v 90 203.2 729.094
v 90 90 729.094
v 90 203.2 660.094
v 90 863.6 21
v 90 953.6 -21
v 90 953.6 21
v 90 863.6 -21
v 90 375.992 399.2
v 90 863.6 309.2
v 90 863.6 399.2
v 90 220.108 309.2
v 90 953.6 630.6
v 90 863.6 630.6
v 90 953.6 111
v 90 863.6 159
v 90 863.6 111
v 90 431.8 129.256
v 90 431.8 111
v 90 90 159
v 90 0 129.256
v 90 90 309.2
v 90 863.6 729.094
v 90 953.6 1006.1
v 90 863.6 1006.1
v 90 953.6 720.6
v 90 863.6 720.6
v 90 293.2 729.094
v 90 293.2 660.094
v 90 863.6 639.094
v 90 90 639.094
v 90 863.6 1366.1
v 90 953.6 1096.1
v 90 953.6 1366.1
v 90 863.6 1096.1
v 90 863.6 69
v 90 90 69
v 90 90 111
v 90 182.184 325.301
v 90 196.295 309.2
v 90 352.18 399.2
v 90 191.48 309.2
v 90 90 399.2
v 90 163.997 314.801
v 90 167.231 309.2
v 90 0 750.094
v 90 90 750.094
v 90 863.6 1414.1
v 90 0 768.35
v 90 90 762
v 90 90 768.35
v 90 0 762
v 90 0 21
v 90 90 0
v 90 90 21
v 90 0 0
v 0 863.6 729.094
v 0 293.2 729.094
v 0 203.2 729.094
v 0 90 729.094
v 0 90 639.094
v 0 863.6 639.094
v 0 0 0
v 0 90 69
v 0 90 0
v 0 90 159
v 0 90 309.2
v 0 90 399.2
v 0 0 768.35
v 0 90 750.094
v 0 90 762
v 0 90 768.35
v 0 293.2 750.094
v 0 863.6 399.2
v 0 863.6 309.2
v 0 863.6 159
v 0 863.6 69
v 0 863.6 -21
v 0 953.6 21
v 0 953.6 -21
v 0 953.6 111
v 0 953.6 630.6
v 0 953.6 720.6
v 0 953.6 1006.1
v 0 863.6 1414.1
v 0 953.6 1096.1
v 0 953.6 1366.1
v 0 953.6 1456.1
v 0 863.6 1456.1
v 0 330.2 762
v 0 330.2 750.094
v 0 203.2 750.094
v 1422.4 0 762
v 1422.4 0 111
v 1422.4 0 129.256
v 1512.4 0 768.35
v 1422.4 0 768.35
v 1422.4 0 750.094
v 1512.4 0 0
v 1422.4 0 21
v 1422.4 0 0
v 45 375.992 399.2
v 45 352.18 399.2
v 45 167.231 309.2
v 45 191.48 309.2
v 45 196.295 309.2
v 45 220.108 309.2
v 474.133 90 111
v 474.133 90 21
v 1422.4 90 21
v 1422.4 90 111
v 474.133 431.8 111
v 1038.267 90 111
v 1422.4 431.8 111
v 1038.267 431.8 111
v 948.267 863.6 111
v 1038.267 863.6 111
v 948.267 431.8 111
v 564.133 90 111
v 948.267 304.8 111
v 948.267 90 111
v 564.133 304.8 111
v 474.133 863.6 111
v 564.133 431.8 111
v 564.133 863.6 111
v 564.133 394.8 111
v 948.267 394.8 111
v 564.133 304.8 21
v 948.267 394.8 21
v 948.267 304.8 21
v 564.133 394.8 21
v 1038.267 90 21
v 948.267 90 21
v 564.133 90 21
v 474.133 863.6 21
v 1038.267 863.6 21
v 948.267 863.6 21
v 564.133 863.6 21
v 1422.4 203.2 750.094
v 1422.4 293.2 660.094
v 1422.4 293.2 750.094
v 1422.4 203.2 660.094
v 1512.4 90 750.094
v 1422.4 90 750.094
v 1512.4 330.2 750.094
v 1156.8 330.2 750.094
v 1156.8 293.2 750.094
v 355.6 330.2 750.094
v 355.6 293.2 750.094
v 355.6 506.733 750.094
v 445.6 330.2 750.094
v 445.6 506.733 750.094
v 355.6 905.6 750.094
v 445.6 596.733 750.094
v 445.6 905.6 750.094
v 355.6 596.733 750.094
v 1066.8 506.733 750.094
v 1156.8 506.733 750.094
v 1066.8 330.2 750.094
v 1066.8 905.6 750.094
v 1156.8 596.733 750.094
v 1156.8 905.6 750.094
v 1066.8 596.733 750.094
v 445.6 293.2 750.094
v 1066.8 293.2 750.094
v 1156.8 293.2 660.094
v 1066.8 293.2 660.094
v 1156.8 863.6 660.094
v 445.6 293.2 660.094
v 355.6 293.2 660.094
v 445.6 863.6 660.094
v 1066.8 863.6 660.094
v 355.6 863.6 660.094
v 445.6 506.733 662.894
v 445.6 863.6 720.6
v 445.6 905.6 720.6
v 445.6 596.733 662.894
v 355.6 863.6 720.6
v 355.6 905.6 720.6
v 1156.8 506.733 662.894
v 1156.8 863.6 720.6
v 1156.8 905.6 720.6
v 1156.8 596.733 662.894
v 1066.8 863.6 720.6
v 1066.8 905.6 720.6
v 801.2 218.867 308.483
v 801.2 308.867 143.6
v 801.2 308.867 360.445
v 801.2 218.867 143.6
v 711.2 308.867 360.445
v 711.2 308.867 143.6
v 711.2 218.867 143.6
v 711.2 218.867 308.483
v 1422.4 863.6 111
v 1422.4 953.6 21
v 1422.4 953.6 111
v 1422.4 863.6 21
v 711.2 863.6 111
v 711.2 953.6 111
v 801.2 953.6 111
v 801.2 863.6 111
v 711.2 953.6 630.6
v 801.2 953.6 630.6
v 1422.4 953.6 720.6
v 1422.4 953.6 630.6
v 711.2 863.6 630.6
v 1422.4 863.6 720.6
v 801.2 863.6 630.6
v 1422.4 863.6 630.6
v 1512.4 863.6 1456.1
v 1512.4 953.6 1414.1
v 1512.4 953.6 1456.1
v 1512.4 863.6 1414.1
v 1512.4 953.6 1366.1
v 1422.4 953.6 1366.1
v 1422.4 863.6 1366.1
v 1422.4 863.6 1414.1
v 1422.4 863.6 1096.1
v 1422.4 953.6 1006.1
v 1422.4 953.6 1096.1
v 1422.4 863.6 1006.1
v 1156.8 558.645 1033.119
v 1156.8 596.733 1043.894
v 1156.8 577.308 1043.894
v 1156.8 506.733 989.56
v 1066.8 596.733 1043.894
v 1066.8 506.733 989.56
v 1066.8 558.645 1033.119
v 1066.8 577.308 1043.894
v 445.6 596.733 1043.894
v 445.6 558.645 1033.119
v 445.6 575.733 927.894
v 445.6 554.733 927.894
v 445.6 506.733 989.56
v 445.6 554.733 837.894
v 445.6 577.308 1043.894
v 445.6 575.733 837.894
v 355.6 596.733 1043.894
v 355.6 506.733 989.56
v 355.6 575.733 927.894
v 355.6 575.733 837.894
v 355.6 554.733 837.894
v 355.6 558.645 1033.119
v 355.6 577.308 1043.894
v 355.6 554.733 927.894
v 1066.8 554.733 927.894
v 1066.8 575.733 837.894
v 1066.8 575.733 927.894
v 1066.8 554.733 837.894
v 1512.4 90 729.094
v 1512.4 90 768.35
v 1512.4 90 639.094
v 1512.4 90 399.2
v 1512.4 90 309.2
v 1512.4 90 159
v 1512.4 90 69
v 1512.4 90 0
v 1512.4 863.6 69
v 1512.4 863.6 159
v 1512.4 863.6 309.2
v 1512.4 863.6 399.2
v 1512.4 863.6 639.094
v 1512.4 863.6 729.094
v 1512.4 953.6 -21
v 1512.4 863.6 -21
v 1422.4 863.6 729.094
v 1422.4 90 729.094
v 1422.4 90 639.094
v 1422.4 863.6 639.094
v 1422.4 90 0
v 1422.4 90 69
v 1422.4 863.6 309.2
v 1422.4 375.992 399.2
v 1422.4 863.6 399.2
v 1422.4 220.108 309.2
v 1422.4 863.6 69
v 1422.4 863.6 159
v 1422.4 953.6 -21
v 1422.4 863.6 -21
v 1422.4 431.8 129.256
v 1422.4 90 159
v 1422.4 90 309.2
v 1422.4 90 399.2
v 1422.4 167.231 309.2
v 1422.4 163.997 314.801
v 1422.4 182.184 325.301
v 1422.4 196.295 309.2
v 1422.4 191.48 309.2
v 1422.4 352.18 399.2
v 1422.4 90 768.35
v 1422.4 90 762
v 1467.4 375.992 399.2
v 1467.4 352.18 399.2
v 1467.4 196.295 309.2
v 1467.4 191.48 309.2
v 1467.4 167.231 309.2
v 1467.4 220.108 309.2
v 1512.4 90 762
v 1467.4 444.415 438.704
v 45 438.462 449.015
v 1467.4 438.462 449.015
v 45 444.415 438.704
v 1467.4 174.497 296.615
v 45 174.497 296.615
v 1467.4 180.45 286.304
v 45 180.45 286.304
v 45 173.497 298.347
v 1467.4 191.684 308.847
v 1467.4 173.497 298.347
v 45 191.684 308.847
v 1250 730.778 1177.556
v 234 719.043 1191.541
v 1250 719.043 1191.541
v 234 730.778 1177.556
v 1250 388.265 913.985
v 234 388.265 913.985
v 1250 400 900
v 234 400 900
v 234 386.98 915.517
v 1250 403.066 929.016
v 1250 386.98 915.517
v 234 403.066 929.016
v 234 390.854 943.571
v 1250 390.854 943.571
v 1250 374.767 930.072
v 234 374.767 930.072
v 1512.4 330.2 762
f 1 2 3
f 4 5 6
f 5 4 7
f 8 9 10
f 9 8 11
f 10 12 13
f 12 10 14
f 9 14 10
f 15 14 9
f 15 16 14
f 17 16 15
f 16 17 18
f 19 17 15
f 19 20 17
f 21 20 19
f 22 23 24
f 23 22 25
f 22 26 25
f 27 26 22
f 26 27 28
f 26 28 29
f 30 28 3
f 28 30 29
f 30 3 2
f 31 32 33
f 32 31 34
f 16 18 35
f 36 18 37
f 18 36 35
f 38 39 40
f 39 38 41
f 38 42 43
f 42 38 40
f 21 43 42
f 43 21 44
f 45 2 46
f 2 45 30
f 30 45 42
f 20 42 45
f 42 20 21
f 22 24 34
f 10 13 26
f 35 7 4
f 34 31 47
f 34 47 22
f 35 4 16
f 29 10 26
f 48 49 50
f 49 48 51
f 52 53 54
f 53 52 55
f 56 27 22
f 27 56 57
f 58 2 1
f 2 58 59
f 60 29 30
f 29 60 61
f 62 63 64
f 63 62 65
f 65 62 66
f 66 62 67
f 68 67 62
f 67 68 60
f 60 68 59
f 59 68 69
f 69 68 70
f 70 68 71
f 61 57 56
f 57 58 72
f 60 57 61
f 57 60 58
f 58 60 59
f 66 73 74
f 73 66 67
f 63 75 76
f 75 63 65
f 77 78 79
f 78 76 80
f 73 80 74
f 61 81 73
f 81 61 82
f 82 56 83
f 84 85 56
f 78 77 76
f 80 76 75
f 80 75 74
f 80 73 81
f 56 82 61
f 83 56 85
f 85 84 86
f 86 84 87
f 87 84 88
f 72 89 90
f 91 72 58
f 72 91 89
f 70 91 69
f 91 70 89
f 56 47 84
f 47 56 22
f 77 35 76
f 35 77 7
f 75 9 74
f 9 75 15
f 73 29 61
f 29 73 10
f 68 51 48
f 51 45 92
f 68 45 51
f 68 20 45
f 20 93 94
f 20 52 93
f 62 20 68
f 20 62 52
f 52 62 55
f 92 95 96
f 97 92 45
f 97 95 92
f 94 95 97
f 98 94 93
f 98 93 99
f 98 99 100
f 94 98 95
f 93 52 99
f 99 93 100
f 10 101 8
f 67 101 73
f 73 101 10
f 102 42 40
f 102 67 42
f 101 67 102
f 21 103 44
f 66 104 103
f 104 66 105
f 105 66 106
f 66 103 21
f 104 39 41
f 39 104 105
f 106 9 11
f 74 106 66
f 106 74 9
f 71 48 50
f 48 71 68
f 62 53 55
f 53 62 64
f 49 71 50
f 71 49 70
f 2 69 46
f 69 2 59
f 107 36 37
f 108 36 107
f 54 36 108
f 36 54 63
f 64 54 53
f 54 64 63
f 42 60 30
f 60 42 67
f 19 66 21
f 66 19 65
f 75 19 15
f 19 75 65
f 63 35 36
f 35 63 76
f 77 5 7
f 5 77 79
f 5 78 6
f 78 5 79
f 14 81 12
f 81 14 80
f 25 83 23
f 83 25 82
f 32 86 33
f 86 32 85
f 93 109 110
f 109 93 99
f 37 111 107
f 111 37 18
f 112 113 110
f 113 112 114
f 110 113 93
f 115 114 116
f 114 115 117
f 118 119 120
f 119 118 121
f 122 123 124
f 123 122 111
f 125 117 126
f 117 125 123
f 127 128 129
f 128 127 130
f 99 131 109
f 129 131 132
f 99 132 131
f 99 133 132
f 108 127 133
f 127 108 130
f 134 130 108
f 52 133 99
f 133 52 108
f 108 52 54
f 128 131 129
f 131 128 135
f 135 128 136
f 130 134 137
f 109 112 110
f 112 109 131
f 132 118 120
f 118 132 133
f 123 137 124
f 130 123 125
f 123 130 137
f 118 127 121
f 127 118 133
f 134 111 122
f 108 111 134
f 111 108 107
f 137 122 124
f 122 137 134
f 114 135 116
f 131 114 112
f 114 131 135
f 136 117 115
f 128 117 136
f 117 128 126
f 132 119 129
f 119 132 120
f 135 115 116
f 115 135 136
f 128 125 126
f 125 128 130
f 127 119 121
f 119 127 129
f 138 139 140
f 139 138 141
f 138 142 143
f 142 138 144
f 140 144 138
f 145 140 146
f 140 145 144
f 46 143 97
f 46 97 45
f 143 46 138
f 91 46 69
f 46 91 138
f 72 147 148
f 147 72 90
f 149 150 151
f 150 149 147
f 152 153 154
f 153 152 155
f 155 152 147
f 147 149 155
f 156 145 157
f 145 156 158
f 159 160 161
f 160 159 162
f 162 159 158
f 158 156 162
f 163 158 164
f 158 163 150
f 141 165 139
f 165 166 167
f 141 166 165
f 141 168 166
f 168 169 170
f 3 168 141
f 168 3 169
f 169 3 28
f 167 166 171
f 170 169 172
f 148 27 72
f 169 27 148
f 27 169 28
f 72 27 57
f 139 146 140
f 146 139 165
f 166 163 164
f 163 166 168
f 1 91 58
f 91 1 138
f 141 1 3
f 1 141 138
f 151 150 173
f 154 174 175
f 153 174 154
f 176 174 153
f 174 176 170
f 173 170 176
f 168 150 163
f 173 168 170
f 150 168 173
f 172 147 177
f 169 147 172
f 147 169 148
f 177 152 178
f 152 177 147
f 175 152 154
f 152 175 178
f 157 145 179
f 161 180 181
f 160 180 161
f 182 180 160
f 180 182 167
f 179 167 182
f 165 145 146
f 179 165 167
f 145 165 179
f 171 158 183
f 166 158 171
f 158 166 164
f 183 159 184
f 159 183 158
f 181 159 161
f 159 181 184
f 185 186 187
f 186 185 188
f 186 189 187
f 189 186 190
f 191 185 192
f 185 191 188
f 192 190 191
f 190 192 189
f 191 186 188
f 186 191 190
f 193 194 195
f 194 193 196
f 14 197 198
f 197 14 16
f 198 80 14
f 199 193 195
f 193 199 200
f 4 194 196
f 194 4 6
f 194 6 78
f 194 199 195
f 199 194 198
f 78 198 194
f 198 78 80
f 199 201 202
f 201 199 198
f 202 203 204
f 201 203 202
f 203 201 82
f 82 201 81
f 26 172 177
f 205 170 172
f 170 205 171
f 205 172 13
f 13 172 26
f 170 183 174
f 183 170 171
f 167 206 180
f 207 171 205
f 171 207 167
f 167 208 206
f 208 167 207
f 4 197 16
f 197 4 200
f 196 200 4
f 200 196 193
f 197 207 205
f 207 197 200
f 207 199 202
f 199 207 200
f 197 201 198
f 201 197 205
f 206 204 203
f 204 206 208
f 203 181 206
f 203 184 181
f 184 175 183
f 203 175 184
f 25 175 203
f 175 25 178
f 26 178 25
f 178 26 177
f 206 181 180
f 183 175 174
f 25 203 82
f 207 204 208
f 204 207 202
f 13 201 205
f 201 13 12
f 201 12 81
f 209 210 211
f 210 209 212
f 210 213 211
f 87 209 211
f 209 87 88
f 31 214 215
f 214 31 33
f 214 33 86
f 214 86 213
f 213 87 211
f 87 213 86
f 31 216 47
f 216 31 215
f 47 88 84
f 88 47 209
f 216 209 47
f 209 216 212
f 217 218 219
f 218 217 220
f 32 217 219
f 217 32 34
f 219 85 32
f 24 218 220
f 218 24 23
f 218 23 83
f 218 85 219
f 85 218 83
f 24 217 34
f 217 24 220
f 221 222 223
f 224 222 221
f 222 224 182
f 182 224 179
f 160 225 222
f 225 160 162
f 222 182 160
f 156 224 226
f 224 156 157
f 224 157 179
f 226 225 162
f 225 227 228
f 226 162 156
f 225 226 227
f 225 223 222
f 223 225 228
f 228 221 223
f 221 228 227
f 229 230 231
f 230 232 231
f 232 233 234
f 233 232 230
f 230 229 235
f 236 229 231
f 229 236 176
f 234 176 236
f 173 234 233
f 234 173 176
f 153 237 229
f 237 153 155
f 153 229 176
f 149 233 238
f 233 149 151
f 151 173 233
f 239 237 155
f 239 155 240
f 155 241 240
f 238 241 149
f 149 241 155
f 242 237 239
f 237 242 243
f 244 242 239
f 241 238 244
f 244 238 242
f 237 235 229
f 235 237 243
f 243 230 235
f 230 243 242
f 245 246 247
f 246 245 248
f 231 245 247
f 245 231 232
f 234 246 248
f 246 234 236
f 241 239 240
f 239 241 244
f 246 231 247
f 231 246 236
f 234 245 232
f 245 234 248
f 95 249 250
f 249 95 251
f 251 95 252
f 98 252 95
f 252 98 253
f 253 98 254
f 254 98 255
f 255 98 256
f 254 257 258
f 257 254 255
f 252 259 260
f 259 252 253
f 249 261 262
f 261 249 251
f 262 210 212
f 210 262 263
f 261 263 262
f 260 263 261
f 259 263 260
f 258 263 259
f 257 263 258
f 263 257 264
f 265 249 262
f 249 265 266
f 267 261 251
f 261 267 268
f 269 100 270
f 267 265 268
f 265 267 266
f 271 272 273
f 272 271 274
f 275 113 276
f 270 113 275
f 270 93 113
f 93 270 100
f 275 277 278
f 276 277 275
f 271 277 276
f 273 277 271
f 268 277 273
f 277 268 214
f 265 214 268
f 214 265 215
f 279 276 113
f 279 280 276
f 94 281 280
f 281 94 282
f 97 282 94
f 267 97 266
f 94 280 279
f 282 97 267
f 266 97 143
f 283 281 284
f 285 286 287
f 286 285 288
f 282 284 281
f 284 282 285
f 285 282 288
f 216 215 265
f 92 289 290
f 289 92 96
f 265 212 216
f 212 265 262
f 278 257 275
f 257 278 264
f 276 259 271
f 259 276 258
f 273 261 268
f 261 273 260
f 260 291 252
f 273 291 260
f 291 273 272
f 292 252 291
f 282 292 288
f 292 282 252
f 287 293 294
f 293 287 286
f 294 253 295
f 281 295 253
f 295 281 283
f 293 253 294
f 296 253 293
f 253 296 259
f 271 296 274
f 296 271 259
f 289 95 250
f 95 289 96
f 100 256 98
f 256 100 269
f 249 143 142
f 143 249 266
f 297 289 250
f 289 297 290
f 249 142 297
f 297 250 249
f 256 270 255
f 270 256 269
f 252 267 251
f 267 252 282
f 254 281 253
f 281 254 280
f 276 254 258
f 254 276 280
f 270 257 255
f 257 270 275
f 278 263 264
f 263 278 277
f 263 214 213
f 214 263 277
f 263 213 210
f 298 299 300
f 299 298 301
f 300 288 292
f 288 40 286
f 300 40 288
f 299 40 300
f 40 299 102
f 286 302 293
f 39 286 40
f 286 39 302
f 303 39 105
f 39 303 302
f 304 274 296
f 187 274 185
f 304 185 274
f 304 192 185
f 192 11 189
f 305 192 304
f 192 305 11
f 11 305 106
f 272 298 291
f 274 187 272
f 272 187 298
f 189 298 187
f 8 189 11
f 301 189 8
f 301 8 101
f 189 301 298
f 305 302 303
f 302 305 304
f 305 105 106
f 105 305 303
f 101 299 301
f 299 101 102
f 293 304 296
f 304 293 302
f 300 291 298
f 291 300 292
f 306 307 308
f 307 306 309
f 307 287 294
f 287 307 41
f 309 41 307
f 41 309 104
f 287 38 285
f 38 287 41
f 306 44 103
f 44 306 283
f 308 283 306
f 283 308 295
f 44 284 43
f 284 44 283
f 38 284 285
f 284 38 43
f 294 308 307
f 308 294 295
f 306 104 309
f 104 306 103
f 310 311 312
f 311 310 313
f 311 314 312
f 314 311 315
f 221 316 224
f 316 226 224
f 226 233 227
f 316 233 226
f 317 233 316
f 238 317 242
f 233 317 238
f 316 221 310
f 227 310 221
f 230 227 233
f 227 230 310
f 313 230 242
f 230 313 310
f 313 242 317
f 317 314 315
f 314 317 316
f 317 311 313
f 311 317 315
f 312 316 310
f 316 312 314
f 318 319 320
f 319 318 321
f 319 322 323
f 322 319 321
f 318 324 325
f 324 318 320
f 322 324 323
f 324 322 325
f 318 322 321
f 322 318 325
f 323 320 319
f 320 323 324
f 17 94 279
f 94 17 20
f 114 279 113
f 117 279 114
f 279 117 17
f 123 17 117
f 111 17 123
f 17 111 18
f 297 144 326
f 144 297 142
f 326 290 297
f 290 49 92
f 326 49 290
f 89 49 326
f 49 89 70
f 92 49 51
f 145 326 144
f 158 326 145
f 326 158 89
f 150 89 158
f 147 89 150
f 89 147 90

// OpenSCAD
// file: wood.scad
// PARAMETERS {{{1
// units are in mm 
inch = 25.4;
// base parameters
oneby = 19;
twoby = 21;
fourby = 90;
// plywood thickness
threequarters = 23 / 32 * inch;
onehalf = 15 / 32 * inch;
onequarter = 7 / 32 * inch;
// 1}}}
// MODULES {{{1
// wood definitions {{{2
module onebytwo(length) {
    cube([oneby, length, twoby]);
}
module twobyfour(length) {
    cube([twoby, length, fourby]);
}
module twobytwo(length) {
    cube([twoby, length, twoby]);
}
module fourbyfour(length) {
    cube([fourby, length, fourby]);
}
module plywood3quarters(length, width) {
  cube([length, width, threequarters]);
}
module plywoodhalf(length, width) {
  cube([length, width, onehalf]);
}
module plywoodquarter(length, width) {
  cube([length, width, onequarter]);
}
// 2}}}
// wood working modules
module tenon(width, depth, height) {
    difference() {
        cube([width, depth, height]);
        translate([width/4, depth/4, -1])
        cube([width/2, depth/2, height+2]);
    }
}

module mortise(width, depth, height = twoby) {
  rotate([90, 0, 0])
    union() {
        cube([width, depth, height]);
        translate([width/4, depth/4, height])
        cube([width/2, depth/2, height/2]);
    }
}
// 2}}}
// applied modules
module mortised4x4(length) {
  union() {
    translate([0, fourby, 0])
    fourbyfour(length - fourby * 2);
    // tenon at one end
    translate([fourby - twoby, fourby + twoby, 0])
    mortise(twoby, fourby, fourby);
    // end of fourbyfour
    translate([0, length - fourby, fourby])
    rotate([180, 0, 0])
    mortise(fourby, fourby, fourby);
  }
}
// 1}}}
//
/*mortise(fourby, fourby, fourby);*/
// mortised4x4(23 * inch);
/*tenon2x4x4(13 * inch);*/
/*color("#3434bc")*/
/*translate([0, 0, 100])*/
/*tenon(10, 10, 10);*/
// easy rotation

module mrotate(
  rotation = [0, 0, 0], 
  origin = [0, 0, 0],
) {
  translate(origin)
  rotate(rotation)
  translate(-origin)
  children();
}
module crossbar(length) {
  cube([length, fourby, fourby]);
}
module leg(length) {
  cube([fourby, fourby, length]);
}
module support(length) {
  cube([fourby, length, fourby]);
}
module shelf(w, l) {
  union() {
    plywoodhalf(l, w);
    rotate([0, 90, 0])
    translate([-onehalf-twoby, 0, 0])
    onebytwo(w);
  }
}

module shelfHD(w, l) {
  mrotate([0, 0, 90])
  union() {
    plywood3quarters(w, l);
    rotate([0, 90, 0])
    translate([-threequarters-twoby, 0, 0])
    onebytwo(l);
  }
}
// main file
include <wood.scad>

// daw parameters
width = 56 * inch;
depth = 34 * inch;
height = (30.25 + 12.25 + 14) * inch;
// shelf heights
keyboard_shelf_height = 30.25 * inch;
second_shelf_height = 12.25 * inch;
third_shelf_height = second_shelf_height + 14 * inch;
// rack dimensions
rack_height = 19.7 * inch;
rack_depth = 9.3 * inch;
rack_width = 5.9 * inch;
rack_equipment_depth = 15 * inch;
// pedal board params
midi_pedal_height = 13 * inch;
midi_pedal_depth = 12 * inch;

module rack() {
  color("orange")
  cube([rack_height, rack_depth, rack_equipment_depth]);
}
module side(
  h = keyboard_shelf_height,
  d = depth,
  max_height = height,
  w = 0
  ) {
  color("#e32fca")
  translate([w, 0, -twoby]) {
    translate([0, 0, h - fourby - threequarters])
    support(d);
    translate([0, 0, midi_pedal_height])
    support(d);
    translate([0, 0, twoby])
    leg(h);
    translate([0, 0, fourby])
    support(d);
    translate([0, d, 0])
    leg(max_height);
  }
}
default_midi_pedal_height = midi_pedal_height - twoby - fourby;
module midi_pedal_support(
  h = default_midi_pedal_height,
) {
    translate([width / 2, depth / 2, twoby])
    mrotate(
      rotation=[90, 180, 180],
      origin=[depth, depth / 6 - fourby, depth / 3])
    {
        translate([0, 0, twoby])
        difference() {
              fourbyfour(h);
              translate([0, -16, -80])
              mrotate([30, 0, 0], [0, -16, -80]) {
                cube([5 * inch, 5 * inch, 8 *inch]);
              }
          }
    }
}
module supports() {
  // next batch of supports
  h = keyboard_shelf_height - fourby - threequarters;
  union() {
    color("yellow")
    translate([0, 0, twoby]) {
      crossbar(width);
      translate([width / 3, 0, 0])
      support(depth);
      translate([width - width / 3, 0, 0])
      support(depth);
      translate([width / 3, midi_pedal_depth, 0])
      crossbar(width / 3);
      translate([0, 8 * inch, keyboard_shelf_height - fourby - threequarters - twoby])
      crossbar(width);
      translate([width / 4, 8 * inch + twoby, keyboard_shelf_height - fourby - threequarters - twoby])
      support(depth - 8 * inch + twoby);
      translate([width - width / 4, 8 * inch + twoby, keyboard_shelf_height - fourby - threequarters - twoby])
      support(depth - 8 * inch + twoby);
    }
    midi_pedal_support();
    translate([0, depth, twoby])
    color("blue") {
      crossbar(width);
      translate([width / 2, 0, 0])
      leg(keyboard_shelf_height - fourby);
      translate([0, 0, 24 * inch])
      crossbar(width);
      translate([0, 0, height - fourby])
      crossbar(width + fourby);
      translate([0, 0, height - fourby * 5])
      crossbar(width);
    }
    color("#45c28f") {
      translate([width / 4, depth - depth * 2 / 3, h + twoby])
      midi_pedal_support(15 * inch);
      translate([-width / 4, depth - depth * 2 / 3, h + twoby])
      midi_pedal_support(15 * inch);
    }
    translate([width / 4, depth - depth / 3 - twoby, h + 7 * inch])
    cube([width / 2, twoby, fourby]);
  }
}
module midi_pedal_board() {
  translate([width + fourby / 2, twoby, 5.7 * inch + midi_pedal_height])
  rotate([0, 0, 90]) {
    mrotate(rotation=[0, -30, 0],
            origin=[depth / 2, midi_pedal_height, 8 * inch])
    shelf(width, 12 * inch);
  }
}

module daw() {
  side();
  supports();
  side(w=width);
  // the main pedal board base
  color("#e3c2a3")
  translate([twoby, 0, fourby + twoby])
  plywood3quarters(width, depth / 2);
  // midi pedal board
  color("#23bcf3")
  midi_pedal_board();
  // keyboard board
  translate([0, 0, keyboard_shelf_height - threequarters])
  plywoodhalf(width + fourby, 13 * inch);
  // top board
  color("#a23344")
  translate([1250, 400, 900])
  mrotate(
    rotation=[40, 0, 0],
    origin=[0, 0, 0]) {
      shelfHD(17 * inch, 40 * inch);
  }
  
}

daw();

// difference() {
     /*daw();*/
//   rack();
// }
